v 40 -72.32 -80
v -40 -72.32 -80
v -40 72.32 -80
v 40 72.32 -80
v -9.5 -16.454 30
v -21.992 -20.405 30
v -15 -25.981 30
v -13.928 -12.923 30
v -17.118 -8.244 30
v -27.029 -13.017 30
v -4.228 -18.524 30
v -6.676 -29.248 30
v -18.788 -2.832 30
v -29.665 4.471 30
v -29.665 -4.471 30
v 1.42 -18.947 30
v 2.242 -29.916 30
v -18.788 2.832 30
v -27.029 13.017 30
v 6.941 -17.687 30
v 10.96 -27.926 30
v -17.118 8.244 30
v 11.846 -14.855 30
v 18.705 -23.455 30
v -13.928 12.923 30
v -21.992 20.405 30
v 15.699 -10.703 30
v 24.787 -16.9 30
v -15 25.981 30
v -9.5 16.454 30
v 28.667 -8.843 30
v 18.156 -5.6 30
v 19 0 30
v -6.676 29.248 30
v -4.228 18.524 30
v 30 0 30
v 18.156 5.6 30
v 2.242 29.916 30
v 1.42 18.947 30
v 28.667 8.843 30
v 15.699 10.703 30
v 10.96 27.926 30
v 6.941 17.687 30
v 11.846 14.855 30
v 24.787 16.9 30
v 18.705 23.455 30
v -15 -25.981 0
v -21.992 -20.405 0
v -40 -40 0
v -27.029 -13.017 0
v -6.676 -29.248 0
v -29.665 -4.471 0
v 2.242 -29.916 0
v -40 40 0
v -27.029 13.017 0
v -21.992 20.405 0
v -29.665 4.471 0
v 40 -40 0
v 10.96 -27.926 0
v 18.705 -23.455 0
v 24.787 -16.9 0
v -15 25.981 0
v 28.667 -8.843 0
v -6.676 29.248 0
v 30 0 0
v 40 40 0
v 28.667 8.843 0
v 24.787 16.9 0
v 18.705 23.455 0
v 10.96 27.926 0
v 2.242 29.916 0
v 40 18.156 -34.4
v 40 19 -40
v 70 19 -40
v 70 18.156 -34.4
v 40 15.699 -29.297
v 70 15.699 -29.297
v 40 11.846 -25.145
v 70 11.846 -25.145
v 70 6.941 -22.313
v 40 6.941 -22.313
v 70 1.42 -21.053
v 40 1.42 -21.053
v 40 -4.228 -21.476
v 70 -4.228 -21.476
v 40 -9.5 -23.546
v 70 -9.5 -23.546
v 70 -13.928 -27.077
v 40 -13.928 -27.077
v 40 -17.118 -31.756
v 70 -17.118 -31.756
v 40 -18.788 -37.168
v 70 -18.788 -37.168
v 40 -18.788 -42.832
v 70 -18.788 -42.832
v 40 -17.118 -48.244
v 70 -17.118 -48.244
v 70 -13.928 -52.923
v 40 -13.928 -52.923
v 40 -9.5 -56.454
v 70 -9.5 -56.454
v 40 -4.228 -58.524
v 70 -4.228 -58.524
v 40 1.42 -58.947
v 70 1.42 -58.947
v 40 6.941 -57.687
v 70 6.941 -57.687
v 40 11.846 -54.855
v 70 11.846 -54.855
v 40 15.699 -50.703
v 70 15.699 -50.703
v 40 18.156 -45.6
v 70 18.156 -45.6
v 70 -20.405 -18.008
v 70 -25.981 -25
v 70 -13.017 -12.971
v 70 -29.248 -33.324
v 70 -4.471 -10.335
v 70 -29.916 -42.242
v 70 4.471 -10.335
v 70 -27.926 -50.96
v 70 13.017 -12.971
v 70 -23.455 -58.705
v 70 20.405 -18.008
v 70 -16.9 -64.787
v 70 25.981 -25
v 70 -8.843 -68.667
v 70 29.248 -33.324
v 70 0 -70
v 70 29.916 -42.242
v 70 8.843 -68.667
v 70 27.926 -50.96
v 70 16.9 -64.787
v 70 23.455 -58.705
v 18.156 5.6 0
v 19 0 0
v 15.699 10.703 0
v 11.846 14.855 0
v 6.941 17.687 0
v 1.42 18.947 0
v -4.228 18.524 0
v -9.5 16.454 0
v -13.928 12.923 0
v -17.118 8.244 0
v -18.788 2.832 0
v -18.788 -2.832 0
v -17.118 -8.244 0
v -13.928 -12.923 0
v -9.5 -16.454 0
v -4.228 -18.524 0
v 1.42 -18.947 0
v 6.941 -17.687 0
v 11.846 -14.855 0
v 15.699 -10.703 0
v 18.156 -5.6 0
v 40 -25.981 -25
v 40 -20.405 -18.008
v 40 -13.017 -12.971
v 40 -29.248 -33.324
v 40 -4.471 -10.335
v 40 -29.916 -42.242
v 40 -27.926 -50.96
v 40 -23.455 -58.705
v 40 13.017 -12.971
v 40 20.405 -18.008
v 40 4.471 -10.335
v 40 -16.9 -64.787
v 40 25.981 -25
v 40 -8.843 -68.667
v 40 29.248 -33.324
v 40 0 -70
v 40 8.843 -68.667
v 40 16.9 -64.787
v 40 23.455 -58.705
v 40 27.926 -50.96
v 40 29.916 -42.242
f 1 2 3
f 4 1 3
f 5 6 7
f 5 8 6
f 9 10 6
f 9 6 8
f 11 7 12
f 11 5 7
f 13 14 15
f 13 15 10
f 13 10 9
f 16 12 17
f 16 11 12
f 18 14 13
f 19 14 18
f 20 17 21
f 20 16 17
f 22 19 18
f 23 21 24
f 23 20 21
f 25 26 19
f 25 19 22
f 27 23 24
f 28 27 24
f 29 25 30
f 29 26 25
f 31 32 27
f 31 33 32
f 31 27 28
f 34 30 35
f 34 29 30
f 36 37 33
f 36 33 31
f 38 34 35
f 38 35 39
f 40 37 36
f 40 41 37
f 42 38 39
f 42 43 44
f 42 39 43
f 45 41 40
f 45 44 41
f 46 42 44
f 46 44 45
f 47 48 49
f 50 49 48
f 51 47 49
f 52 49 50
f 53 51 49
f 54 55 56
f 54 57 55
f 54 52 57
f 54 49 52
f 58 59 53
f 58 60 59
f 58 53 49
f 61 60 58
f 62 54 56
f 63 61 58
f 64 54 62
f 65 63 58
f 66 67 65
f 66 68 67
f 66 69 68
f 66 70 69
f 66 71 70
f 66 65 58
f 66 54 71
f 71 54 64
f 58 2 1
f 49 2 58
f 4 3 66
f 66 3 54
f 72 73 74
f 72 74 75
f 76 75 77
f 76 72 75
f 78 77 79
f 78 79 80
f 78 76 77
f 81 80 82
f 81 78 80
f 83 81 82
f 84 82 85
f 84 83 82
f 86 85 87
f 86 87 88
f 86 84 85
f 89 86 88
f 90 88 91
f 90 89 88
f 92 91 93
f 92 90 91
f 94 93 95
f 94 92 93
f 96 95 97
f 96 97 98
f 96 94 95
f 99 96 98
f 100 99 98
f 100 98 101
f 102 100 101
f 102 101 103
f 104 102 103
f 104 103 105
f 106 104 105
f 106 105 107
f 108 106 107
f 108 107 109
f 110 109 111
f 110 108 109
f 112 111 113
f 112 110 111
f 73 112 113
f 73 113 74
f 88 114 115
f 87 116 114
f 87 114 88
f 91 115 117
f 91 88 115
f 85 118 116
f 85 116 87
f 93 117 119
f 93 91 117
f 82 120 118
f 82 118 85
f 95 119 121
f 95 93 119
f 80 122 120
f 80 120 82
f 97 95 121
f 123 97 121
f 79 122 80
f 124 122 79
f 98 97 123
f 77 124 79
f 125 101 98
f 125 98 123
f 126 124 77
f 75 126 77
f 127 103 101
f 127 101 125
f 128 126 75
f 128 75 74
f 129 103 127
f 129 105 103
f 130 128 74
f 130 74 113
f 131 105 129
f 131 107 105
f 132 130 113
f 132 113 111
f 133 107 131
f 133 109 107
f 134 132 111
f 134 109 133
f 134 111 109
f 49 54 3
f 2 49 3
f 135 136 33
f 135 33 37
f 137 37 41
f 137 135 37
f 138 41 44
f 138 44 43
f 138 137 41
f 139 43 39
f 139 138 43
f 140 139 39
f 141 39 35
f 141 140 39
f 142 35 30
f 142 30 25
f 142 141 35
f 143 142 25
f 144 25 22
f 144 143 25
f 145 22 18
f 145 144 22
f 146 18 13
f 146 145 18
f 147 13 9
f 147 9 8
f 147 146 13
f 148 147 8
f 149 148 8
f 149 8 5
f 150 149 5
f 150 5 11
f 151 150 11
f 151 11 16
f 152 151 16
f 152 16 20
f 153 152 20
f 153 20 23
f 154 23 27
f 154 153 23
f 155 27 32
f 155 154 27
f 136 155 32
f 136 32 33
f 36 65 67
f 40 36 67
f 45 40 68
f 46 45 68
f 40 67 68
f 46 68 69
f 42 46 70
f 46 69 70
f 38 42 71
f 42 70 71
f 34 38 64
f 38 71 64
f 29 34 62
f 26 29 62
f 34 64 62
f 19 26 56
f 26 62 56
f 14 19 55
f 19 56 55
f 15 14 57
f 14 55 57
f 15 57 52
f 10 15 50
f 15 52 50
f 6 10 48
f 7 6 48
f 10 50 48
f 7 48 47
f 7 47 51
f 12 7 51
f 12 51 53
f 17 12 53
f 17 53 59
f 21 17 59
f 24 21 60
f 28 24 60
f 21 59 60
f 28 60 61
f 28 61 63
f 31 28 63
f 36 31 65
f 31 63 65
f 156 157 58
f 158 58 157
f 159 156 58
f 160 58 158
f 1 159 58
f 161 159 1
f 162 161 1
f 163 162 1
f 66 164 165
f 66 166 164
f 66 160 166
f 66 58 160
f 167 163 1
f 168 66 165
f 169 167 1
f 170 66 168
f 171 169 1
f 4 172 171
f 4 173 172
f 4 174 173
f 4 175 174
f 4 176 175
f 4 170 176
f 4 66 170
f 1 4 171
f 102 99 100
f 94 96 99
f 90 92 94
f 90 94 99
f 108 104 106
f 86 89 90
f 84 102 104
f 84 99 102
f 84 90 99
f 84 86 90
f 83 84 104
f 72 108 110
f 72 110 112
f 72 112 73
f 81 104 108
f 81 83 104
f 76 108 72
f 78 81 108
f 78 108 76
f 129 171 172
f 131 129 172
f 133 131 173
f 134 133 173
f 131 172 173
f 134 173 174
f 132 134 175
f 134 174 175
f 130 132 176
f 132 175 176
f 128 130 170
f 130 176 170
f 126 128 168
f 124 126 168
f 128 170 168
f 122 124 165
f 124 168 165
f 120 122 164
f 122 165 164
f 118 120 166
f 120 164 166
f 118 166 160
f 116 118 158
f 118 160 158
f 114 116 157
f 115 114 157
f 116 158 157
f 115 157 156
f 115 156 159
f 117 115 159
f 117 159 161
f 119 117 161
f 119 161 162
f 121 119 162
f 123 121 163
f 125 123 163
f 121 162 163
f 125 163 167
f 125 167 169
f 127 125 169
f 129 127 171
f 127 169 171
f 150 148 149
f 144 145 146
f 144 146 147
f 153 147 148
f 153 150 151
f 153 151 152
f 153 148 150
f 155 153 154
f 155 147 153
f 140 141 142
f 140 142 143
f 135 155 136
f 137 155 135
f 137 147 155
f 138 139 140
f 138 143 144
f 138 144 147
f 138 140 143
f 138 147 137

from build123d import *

# Parameters (mm, degrees)
CROQUIS1_R              = 30
CROQUIS1_R_2            = 19
SALIENTE_EXTRUIR1_DEPTH = 30
CROQUIS2_W              = 80
CROQUIS2_H              = 80
SALIENTE_EXTRUIR2_DEPTH = 80
CROQUIS3_R              = 30
CROQUIS3_R_2            = 19
SALIENTE_EXTRUIR3_DEPTH = 30
SALIENTE_EXTRUIR4_DEPTH = 80


with BuildPart() as part:
    # Croquis1 → Saliente-Extruir1 (new body)
    with BuildSketch(Plane.XY):
        Circle(CROQUIS1_R)
        Circle(CROQUIS1_R_2, mode=Mode.SUBTRACT)
    extrude(amount=SALIENTE_EXTRUIR1_DEPTH)

    # Croquis2 → Saliente-Extruir2 (add)
    with BuildSketch(Plane.XY):
        Rectangle(CROQUIS2_W, CROQUIS2_H)
    extrude(amount=-SALIENTE_EXTRUIR2_DEPTH)

    # Croquis3 → Saliente-Extruir3 (add)
    with BuildSketch(Plane(origin=(40, 0, 0), x_dir=(0, 0, -1), z_dir=(1, 0, 0))):
        with Locations((40, 0)):
            Circle(CROQUIS3_R)
        with Locations(Location((40, 0, 0), (0, 0, 90))):
            Circle(CROQUIS3_R_2, mode=Mode.SUBTRACT)
    extrude(amount=SALIENTE_EXTRUIR3_DEPTH)

    # Croquis4 → Saliente-Extruir4 (add)
    with BuildSketch(Plane(origin=(-40, 0, 0), x_dir=(0, 0, -1), z_dir=(1, 0, 0))):
        Polygon((80, 40), (80, 72.32), (0, 40), align=None)
        Polygon((0, -40), (80, -40), (80, -72.32), align=None)
    extrude(amount=SALIENTE_EXTRUIR4_DEPTH)


solid = part.part
